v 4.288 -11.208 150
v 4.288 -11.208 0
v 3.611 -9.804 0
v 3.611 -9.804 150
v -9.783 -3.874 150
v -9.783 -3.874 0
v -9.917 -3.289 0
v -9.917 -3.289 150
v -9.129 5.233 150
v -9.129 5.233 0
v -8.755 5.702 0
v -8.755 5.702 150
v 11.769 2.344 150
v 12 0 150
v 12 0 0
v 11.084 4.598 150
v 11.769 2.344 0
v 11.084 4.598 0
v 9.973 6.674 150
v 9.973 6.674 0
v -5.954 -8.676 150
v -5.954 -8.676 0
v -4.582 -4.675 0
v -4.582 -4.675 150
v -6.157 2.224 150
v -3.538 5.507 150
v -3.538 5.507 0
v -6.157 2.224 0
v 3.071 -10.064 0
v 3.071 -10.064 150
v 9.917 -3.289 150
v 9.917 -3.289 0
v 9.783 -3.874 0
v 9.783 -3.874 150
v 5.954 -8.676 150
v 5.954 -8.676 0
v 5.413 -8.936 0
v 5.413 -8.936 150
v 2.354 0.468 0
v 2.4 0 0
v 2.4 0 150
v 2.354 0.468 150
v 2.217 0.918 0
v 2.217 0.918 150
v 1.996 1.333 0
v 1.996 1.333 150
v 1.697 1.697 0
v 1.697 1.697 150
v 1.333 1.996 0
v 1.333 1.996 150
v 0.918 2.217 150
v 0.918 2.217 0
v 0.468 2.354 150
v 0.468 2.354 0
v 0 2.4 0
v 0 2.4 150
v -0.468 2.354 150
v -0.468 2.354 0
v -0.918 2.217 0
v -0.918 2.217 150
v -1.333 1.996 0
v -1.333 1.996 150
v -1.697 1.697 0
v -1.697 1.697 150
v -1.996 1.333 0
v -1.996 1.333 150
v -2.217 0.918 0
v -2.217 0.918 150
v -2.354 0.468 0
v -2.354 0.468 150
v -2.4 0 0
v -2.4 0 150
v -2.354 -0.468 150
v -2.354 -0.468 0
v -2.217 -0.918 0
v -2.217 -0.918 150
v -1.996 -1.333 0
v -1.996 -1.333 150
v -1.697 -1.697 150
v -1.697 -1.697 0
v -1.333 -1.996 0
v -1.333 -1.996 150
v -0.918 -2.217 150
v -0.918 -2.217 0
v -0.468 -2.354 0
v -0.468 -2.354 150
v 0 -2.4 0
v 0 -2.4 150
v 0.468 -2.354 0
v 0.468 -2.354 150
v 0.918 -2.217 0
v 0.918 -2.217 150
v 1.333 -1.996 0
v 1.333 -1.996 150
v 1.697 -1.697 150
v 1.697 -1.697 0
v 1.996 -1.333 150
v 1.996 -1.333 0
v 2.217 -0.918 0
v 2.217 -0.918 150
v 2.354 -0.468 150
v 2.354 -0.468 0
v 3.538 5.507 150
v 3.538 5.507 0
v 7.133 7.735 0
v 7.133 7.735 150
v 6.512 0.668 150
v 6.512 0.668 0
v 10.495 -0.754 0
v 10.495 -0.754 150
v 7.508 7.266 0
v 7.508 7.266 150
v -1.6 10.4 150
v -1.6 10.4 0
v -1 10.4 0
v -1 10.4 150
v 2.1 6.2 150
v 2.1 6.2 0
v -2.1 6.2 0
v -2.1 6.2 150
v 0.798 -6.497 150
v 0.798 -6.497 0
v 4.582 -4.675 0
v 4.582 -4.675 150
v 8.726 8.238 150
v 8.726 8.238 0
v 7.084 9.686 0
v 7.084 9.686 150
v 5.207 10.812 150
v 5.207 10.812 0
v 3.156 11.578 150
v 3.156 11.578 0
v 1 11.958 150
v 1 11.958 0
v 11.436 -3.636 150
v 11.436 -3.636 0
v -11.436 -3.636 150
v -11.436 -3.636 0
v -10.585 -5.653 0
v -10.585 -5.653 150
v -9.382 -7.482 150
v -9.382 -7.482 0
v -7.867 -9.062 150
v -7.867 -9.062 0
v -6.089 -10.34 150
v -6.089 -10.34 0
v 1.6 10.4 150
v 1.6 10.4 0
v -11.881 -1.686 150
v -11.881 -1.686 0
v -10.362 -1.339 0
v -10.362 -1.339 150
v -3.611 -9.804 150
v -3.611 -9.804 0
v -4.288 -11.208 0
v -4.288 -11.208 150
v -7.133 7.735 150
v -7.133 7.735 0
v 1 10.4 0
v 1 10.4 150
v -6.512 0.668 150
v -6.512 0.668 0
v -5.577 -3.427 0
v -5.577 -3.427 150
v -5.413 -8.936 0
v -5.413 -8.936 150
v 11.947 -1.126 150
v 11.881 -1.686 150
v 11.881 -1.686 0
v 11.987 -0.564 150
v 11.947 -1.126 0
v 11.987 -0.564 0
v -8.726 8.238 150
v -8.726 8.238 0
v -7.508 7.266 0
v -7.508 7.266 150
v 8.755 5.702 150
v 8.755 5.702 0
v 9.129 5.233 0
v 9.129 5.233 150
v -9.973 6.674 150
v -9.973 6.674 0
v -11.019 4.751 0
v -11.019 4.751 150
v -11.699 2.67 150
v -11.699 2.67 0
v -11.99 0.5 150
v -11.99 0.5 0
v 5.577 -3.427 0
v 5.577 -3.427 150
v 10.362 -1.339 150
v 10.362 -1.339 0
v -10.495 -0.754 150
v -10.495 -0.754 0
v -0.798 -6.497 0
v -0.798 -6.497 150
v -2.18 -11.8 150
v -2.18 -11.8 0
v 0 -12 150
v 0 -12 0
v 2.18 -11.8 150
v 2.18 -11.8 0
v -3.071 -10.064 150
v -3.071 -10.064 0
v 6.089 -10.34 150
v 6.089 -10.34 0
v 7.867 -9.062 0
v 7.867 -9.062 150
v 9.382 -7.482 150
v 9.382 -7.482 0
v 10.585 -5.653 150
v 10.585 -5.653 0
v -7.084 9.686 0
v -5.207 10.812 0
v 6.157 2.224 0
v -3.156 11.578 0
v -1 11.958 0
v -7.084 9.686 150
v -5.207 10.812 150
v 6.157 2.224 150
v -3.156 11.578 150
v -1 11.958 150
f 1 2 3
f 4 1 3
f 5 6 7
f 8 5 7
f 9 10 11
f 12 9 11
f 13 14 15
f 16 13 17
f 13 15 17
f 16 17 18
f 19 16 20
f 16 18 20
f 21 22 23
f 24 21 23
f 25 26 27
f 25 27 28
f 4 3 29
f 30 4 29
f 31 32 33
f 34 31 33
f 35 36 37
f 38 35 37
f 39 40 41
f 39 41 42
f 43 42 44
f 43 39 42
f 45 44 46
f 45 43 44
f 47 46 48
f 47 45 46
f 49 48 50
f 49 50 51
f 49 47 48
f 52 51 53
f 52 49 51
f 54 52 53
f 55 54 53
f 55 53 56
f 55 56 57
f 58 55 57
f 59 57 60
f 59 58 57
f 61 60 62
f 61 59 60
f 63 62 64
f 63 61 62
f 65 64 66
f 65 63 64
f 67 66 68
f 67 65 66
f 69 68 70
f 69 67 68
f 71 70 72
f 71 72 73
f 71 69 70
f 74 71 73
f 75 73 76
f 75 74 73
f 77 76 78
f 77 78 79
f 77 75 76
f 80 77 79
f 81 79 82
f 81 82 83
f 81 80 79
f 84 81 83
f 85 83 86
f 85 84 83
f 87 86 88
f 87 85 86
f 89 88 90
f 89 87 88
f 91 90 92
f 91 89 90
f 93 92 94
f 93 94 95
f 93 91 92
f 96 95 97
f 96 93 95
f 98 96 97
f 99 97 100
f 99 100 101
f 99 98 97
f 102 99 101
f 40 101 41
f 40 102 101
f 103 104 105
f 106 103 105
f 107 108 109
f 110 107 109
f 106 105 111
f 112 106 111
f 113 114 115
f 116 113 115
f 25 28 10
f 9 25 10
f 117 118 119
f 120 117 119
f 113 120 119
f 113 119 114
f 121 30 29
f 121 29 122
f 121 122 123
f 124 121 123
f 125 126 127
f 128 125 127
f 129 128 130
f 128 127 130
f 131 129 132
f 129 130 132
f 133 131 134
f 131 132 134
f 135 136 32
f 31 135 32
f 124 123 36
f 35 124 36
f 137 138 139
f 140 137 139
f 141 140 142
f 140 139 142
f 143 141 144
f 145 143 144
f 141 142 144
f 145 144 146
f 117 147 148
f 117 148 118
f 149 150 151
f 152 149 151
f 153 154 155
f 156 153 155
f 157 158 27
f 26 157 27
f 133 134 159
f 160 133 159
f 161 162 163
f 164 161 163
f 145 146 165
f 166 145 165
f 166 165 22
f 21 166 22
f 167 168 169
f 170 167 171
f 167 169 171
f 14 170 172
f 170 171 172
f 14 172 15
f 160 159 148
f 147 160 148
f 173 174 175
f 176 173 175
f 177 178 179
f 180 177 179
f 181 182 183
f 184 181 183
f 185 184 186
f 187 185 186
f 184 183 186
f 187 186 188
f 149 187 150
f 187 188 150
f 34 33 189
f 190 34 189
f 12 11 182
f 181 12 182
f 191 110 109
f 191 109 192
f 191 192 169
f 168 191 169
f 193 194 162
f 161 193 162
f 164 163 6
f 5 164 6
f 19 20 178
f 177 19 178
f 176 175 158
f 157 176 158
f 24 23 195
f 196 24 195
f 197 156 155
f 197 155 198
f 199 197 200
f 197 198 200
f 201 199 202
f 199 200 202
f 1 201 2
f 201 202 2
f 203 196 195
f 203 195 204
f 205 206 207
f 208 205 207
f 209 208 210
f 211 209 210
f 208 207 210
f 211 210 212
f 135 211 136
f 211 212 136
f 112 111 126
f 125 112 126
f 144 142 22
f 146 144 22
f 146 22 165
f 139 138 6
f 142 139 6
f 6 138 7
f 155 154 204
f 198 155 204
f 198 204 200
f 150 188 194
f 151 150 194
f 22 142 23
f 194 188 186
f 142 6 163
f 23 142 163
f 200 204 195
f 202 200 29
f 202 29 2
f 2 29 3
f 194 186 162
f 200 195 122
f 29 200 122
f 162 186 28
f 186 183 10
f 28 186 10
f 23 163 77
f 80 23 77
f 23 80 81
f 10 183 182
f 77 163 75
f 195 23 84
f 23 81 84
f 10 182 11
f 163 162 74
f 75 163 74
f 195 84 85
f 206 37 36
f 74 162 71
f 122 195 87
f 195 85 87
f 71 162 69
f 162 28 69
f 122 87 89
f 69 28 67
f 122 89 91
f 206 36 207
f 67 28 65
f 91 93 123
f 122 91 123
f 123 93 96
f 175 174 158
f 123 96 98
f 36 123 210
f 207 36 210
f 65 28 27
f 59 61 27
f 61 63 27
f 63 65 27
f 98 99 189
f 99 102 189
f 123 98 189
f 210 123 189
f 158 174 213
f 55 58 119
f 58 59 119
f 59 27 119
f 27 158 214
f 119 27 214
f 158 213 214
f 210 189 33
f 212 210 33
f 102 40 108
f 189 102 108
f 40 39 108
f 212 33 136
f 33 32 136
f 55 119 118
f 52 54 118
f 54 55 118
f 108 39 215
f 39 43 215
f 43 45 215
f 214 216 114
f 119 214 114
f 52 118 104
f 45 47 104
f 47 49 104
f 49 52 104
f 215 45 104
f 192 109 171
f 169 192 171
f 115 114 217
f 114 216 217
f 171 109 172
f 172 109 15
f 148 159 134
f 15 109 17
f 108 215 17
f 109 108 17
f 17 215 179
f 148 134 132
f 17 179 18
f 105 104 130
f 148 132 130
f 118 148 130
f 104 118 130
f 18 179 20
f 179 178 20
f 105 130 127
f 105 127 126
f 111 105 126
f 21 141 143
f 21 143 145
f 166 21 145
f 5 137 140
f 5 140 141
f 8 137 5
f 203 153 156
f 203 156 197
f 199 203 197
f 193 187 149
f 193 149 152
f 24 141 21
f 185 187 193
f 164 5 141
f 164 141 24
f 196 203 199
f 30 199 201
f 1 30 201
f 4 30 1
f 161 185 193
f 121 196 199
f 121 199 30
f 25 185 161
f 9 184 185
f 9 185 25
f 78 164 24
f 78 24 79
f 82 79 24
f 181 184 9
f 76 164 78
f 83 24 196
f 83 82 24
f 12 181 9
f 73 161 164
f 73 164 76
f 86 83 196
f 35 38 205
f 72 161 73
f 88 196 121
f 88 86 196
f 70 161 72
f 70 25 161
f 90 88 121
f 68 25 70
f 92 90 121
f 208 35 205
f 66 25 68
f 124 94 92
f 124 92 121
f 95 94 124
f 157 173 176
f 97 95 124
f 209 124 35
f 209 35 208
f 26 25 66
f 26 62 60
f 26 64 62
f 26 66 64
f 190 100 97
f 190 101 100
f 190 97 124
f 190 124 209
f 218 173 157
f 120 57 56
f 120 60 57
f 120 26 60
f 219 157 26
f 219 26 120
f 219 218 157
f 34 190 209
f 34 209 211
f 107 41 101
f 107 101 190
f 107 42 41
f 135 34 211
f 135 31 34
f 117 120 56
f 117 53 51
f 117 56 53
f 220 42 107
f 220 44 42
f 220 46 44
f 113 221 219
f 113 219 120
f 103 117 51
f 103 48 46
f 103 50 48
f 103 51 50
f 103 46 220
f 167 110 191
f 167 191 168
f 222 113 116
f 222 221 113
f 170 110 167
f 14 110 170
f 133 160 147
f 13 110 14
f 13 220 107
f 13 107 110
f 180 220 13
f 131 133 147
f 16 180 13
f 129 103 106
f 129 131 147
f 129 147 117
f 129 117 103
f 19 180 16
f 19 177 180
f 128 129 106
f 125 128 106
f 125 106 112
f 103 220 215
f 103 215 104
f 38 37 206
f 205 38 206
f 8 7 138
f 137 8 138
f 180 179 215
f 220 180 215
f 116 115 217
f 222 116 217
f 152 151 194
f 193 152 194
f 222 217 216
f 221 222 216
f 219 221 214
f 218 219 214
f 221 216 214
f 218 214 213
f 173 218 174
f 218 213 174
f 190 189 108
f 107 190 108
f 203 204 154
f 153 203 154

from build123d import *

# Parameters (mm, degrees)
F0_R     = 2.4
F1_DEPTH = 150


# Not quite as in the source:
# - a feature names something its author has since deleted; it is built from what else it names


with BuildPart() as f1:
    # F0 (on Top) → F1 (new body)
    with BuildSketch(Plane.XY):
        with BuildLine():
            ThreePointArc((11.8809631136, -1.6860354369), (11.9702037861, -0.8451161569), (12, 0))
            ThreePointArc((12, 0), (11.4820297491, 3.4875482565), (9.9728345264, 6.6740221388))
            Line((9.9728345264, 6.6740221388), (8.7545372195, 5.7024624569))
            Line((8.7545372195, 5.7024624569), (9.1286311006, 5.2333635674))
            Line((9.1286311006, 5.2333635674), (6.1566837752, 2.2237906583))
            Line((6.1566837752, 2.2237906583), (3.5380266074, 5.5074828847))
            Line((3.5380266074, 5.5074828847), (7.1334637347, 7.7352243113))
            Line((7.1334637347, 7.7352243113), (7.5075576158, 7.2661254218))
            Line((7.5075576158, 7.2661254218), (8.7258549227, 8.2376851038))
            ThreePointArc((8.7258549227, 8.2376851038), (5.2066048694, 10.8116264148), (1, 11.9582607431))
            Line((1, 11.9582607431), (1, 10.4))
            Line((1, 10.4), (1.6, 10.4))
            Line((1.6, 10.4), (2.1, 6.2))
            Line((2.1, 6.2), (-2.1, 6.2))
            Line((-2.1, 6.2), (-1.6, 10.4))
            Line((-1.6, 10.4), (-1, 10.4))
            Line((-1, 10.4), (-1, 11.9582607431))
            ThreePointArc((-1, 11.9582607431), (-5.2066048694, 10.8116264148), (-8.7258549227, 8.2376851038))
            Line((-8.7258549227, 8.2376851038), (-7.5075576158, 7.2661254218))
            Line((-7.5075576158, 7.2661254218), (-7.1334637347, 7.7352243113))
            Line((-7.1334637347, 7.7352243113), (-3.5380266074, 5.5074828847))
            Line((-3.5380266074, 5.5074828847), (-6.1566837752, 2.2237906583))
            Line((-6.1566837752, 2.2237906583), (-9.1286311006, 5.2333635674))
            Line((-9.1286311006, 5.2333635674), (-8.7545372195, 5.7024624569))
            Line((-8.7545372195, 5.7024624569), (-9.9728345264, 6.6740221388))
            ThreePointArc((-9.9728345264, 6.6740221388), (-11.6991349462, 2.6702512075), (-11.8809631136, -1.6860354369))
            Line((-11.8809631136, -1.6860354369), (-10.3617712206, -1.339289801))
            Line((-10.3617712206, -1.339289801), (-10.495283781, -0.7543330537))
            Line((-10.495283781, -0.7543330537), (-6.5118470168, 0.6677188251))
            Line((-6.5118470168, 0.6677188251), (-5.5772590942, -3.4269784061))
            Line((-5.5772590942, -3.4269784061), (-9.7832167924, -3.8741023726))
            Line((-9.7832167924, -3.8741023726), (-9.9167293527, -3.2891456253))
            Line((-9.9167293527, -3.2891456253), (-11.4359212456, -3.6358912612))
            ThreePointArc((-11.4359212456, -3.6358912612), (-9.3819777896, -7.4818776223), (-6.0894637525, -10.3401369047))
            Line((-6.0894637525, -10.3401369047), (-5.4133597547, -8.9361924871))
            Line((-5.4133597547, -8.9361924871), (-5.9539410755, -8.6758622436))
            Line((-5.9539410755, -8.6758622436), (-4.5821138051, -4.6748511288))
            Line((-4.5821138051, -4.6748511288), (-0.7980445599, -6.4971628331))
            Line((-0.7980445599, -6.4971628331), (-3.0708406982, -10.0642902088))
            Line((-3.0708406982, -10.0642902088), (-3.6114220189, -9.8039599653))
            Line((-3.6114220189, -9.8039599653), (-4.2875260167, -11.2079043829))
            ThreePointArc((-4.2875260167, -11.2079043829), (0, -12), (4.2875260167, -11.2079043829))
            Line((4.2875260167, -11.2079043829), (3.6114220189, -9.8039599653))
            Line((3.6114220189, -9.8039599653), (3.0708406982, -10.0642902088))
            Line((3.0708406982, -10.0642902088), (0.7980445599, -6.4971628331))
            Line((0.7980445599, -6.4971628331), (4.5821138051, -4.6748511288))
            Line((4.5821138051, -4.6748511288), (5.9539410755, -8.6758622436))
            Line((5.9539410755, -8.6758622436), (5.4133597547, -8.9361924871))
            Line((5.4133597547, -8.9361924871), (6.0894637525, -10.3401369047))
            ThreePointArc((6.0894637525, -10.3401369047), (9.3819777896, -7.4818776223), (11.4359212456, -3.6358912612))
            Line((11.4359212456, -3.6358912612), (9.9167293527, -3.2891456253))
            Line((9.9167293527, -3.2891456253), (9.7832167924, -3.8741023726))
            Line((9.7832167924, -3.8741023726), (5.5772590942, -3.4269784061))
            Line((5.5772590942, -3.4269784061), (6.5118470168, 0.6677188251))
            Line((6.5118470168, 0.6677188251), (10.495283781, -0.7543330537))
            Line((10.495283781, -0.7543330537), (10.3617712206, -1.339289801))
            Line((10.3617712206, -1.339289801), (11.8809631136, -1.6860354369))
        make_face()
        Circle(F0_R, mode=Mode.SUBTRACT)
    extrude(amount=F1_DEPTH)


solid = f1.part
